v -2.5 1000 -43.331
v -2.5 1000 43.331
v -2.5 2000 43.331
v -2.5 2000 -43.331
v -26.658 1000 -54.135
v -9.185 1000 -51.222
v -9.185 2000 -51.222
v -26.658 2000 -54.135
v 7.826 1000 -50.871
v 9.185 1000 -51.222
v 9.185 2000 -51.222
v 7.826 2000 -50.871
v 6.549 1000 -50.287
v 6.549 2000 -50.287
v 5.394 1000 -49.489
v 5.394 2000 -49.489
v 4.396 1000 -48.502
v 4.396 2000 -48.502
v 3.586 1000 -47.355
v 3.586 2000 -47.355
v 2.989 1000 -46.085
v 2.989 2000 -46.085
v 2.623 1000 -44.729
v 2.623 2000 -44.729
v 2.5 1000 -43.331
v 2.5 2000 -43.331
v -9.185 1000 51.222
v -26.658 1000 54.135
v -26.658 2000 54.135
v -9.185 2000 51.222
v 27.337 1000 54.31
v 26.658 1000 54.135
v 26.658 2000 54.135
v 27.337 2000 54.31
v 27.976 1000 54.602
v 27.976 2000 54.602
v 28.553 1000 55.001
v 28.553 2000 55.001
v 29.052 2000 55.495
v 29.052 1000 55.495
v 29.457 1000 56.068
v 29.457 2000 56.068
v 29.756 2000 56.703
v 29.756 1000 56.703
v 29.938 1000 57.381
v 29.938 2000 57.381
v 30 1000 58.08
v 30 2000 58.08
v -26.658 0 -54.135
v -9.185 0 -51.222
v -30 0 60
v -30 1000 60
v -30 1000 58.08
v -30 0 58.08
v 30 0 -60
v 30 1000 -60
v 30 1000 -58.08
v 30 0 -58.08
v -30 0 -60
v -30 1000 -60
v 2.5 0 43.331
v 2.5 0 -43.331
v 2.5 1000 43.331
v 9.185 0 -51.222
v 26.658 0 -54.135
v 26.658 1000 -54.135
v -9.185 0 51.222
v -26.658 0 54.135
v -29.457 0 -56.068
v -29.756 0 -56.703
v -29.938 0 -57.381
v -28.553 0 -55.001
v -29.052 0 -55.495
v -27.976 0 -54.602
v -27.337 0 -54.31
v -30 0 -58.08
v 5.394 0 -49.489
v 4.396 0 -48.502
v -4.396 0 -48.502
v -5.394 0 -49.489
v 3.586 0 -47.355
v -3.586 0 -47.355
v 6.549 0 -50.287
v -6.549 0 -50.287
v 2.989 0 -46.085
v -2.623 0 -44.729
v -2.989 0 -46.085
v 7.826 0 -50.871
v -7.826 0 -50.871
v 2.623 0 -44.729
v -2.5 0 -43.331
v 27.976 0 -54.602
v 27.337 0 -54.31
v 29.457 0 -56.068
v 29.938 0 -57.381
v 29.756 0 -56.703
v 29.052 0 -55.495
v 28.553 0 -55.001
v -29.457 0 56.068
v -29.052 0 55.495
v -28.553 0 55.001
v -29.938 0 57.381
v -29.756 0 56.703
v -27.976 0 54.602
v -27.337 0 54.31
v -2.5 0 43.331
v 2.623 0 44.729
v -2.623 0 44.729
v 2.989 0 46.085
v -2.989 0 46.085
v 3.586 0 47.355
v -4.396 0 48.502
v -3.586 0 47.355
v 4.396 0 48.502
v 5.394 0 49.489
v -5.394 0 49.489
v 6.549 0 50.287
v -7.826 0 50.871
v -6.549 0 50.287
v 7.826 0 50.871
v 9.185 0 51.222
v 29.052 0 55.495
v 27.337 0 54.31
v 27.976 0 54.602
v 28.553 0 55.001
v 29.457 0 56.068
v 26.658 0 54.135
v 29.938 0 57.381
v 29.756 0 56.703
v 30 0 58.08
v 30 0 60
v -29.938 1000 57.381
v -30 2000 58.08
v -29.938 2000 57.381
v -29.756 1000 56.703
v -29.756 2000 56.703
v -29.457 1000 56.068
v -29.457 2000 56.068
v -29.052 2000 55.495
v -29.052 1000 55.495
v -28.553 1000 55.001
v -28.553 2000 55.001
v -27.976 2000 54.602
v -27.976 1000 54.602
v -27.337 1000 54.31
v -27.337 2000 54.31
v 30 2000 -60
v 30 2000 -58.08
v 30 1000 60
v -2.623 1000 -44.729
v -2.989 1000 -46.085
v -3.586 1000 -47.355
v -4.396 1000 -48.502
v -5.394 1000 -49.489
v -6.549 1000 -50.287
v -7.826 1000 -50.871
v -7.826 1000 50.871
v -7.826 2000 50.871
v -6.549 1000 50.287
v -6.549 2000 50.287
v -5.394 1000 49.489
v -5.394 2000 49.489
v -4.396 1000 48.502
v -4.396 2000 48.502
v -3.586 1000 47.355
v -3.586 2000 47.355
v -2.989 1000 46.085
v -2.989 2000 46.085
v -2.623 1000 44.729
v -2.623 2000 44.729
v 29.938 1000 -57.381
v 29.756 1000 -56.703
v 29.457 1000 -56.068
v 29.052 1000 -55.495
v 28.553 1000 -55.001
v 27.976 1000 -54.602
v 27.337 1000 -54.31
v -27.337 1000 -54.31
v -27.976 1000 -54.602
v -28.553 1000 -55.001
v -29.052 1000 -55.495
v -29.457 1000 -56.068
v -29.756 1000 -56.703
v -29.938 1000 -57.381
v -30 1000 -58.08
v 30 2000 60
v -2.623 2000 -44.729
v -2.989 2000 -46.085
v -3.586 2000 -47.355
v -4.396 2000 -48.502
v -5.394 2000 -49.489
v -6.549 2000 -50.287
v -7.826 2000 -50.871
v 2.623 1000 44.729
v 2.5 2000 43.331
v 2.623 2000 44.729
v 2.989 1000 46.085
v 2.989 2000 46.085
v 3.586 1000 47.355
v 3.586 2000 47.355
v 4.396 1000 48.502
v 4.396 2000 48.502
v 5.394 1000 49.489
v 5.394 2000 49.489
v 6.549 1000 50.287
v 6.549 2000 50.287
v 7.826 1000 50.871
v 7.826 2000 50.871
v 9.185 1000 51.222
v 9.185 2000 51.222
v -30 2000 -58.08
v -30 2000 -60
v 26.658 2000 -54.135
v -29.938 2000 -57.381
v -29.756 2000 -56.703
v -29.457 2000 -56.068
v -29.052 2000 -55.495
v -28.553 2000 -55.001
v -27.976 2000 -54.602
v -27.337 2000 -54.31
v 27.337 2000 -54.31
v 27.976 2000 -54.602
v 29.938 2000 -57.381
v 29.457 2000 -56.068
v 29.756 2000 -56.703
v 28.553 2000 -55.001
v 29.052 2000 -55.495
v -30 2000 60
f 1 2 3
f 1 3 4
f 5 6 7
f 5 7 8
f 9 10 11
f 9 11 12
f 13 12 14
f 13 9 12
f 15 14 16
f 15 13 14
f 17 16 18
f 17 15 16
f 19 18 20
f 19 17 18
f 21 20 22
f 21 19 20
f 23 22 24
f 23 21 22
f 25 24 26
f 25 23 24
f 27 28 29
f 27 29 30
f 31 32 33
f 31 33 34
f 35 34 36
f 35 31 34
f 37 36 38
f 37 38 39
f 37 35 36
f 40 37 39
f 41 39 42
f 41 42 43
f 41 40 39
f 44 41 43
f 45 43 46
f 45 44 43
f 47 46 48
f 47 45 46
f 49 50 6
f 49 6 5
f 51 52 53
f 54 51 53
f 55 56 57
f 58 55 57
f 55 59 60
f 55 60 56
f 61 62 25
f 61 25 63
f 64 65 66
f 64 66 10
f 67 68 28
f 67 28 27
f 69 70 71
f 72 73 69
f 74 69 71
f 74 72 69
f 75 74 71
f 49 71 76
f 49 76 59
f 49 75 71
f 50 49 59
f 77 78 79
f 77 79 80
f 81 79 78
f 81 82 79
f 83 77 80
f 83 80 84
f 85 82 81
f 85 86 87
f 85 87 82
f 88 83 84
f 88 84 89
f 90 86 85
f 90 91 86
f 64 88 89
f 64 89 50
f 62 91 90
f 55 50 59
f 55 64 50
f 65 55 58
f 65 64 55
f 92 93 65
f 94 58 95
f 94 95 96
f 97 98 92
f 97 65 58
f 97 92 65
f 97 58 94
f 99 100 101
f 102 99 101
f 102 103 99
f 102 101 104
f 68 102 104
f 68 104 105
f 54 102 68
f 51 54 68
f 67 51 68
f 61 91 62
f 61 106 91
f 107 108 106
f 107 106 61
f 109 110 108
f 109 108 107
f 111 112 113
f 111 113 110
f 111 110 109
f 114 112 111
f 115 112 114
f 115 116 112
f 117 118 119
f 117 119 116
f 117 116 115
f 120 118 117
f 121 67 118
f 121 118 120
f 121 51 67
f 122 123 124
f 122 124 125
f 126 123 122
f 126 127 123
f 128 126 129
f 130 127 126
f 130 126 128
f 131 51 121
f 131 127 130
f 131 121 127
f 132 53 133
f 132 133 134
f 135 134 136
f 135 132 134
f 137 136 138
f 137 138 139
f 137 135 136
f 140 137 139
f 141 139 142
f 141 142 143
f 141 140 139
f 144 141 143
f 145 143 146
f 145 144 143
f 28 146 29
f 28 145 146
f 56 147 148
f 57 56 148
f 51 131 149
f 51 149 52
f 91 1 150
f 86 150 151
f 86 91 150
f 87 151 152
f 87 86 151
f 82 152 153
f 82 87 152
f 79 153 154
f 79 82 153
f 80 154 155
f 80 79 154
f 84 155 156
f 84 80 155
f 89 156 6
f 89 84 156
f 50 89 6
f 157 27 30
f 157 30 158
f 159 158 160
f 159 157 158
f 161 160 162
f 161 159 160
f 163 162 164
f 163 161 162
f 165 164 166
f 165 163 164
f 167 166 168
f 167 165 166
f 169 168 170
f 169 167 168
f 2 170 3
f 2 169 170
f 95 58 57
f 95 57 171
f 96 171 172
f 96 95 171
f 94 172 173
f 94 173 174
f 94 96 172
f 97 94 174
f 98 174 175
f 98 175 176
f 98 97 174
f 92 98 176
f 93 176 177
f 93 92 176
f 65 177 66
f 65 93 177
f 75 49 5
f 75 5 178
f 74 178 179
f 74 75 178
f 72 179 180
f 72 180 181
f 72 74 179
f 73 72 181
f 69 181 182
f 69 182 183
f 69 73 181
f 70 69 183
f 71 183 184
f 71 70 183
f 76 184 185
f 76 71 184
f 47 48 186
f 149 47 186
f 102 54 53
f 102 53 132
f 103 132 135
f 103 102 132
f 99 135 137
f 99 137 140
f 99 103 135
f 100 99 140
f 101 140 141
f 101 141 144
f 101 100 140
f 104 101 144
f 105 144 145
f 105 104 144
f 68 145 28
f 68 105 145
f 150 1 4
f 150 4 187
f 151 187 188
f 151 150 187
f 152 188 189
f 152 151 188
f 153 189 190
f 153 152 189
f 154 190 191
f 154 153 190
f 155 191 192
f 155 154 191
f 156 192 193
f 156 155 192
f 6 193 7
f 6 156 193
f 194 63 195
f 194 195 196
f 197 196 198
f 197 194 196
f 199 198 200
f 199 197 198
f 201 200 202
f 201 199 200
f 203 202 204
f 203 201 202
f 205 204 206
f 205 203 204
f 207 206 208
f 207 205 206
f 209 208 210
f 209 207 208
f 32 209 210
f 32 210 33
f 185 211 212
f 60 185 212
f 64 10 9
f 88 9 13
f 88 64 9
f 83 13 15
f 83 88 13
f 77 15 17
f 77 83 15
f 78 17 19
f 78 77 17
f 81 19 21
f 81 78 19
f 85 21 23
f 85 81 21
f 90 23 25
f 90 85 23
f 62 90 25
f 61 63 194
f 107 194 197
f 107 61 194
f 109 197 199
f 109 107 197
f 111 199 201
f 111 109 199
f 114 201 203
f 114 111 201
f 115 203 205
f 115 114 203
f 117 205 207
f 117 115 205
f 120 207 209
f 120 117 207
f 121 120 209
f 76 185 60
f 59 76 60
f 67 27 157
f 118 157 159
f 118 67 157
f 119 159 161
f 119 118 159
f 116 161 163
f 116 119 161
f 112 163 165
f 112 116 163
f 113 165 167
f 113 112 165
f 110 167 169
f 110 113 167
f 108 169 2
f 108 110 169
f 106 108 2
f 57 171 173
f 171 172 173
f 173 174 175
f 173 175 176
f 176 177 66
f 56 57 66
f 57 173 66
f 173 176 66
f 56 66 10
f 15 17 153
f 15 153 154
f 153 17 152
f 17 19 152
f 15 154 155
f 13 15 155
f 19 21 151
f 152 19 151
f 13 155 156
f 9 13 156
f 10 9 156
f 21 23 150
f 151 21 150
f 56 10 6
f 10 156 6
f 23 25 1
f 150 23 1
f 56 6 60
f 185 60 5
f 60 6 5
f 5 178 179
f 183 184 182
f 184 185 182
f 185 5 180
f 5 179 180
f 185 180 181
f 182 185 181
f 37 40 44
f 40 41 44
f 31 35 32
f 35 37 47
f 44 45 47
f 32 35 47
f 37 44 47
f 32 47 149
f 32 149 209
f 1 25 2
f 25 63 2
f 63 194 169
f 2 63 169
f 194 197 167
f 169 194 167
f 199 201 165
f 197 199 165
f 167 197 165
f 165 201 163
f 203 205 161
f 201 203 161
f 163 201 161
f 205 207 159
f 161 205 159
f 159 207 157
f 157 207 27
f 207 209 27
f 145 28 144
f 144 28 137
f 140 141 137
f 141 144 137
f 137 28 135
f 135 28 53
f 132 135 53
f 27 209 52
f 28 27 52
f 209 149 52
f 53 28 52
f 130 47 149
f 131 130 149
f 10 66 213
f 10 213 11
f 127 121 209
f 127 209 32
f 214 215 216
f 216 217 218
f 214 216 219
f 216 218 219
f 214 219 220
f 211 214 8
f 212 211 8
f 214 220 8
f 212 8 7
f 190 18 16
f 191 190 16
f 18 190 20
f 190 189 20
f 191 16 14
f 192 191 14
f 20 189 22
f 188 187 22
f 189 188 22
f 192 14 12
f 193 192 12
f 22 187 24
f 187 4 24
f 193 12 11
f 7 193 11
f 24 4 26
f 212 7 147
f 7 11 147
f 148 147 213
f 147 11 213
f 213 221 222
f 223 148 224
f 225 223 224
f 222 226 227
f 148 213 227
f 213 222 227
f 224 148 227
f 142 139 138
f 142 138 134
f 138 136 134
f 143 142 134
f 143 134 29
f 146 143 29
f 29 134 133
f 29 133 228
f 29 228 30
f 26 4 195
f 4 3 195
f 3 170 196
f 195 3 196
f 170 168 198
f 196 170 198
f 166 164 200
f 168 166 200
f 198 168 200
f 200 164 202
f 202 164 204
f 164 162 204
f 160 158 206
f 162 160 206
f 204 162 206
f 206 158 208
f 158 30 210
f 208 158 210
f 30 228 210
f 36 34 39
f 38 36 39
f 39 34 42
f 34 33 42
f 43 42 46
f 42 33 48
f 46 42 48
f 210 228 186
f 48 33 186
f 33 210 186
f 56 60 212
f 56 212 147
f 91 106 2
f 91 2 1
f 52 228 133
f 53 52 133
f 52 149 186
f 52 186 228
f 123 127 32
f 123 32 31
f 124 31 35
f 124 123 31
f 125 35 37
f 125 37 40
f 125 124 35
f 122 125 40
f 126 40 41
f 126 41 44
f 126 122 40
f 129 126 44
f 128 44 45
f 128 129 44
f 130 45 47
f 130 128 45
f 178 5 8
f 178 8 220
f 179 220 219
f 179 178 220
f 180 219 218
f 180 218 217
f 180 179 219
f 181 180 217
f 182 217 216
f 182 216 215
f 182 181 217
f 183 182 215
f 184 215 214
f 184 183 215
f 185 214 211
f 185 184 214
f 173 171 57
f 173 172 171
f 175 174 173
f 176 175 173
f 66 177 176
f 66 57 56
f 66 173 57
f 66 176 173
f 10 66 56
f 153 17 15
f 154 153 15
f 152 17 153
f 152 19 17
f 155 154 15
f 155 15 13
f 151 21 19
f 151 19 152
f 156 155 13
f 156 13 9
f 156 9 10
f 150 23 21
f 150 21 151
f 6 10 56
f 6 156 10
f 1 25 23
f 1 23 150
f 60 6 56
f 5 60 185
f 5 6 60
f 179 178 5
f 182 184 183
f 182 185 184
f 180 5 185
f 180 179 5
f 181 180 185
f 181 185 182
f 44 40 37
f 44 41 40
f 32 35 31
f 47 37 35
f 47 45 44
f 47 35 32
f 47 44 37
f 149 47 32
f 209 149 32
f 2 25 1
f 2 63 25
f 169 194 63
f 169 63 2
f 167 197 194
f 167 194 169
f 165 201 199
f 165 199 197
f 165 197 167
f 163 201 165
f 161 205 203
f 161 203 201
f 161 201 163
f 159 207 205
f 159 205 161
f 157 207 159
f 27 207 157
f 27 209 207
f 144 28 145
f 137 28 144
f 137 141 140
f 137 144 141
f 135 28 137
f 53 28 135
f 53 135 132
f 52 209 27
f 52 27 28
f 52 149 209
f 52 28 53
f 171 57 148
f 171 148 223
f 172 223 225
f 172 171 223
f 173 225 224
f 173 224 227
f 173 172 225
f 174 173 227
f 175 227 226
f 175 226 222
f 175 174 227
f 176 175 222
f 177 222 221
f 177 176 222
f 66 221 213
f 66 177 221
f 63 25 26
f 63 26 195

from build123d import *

# Parameters (mm, degrees)
SB_BEAM_120_X_12_1_DEPTH = 2000
SPLIT1_SURFACE_1_BACK    = 2005.495
SPLIT1_SURFACE_1_DEPTH   = 4010.99
SPLIT1_SURFACE_2_BACK    = 2005.495
SPLIT1_SURFACE_2_DEPTH   = 4010.99


with BuildPart() as part:
    # Sketch15 → Sb beam 120 X 12(1) (new body)
    with BuildSketch(Plane(origin=(0, 0, 0), x_dir=(-1, 0, 0), z_dir=(0, 1, 0))):
        with BuildLine():
            Line((-30, -60), (-30, -58.080070835))
            ThreePointArc((-30, -58.080070835), (-29.052095223, -55.494589303), (-26.657642624, -54.134502919))
            Line((-26.657642624, -54.134502919), (-9.184714752, -51.222135832))
            ThreePointArc((-9.184714752, -51.222135832), (-4.395809555, -48.501963064), (-2.5, -43.331))
            Line((-2.5, -43.331), (-2.5, 43.331))
            ThreePointArc((-2.5, 43.331), (-4.395809555, 48.501963064), (-9.184714752, 51.222135832))
            Line((-9.184714752, 51.222135832), (-26.657642624, 54.134502919))
            ThreePointArc((-26.657642624, 54.134502919), (-29.052095223, 55.494589303), (-30, 58.080070835))
            Line((-30, 58.080070835), (-30, 60))
            Line((-30, 60), (30, 60))
            Line((30, 60), (30, 58.080070835))
            ThreePointArc((30, 58.080070835), (29.052095223, 55.494589303), (26.657642624, 54.134502919))
            Line((26.657642624, 54.134502919), (9.184714752, 51.222135832))
            ThreePointArc((9.184714752, 51.222135832), (4.395809555, 48.501963064), (2.5, 43.331))
            Line((2.5, 43.331), (2.5, -43.331))
            ThreePointArc((2.5, -43.331), (4.395809555, -48.501963064), (9.184714752, -51.222135832))
            Line((9.184714752, -51.222135832), (26.657642624, -54.134502919))
            ThreePointArc((26.657642624, -54.134502919), (29.052095223, -55.494589303), (30, -58.080070835))
            Line((30, -58.080070835), (30, -60))
            Line((30, -60), (-30, -60))
        make_face()
    extrude(amount=SB_BEAM_120_X_12_1_DEPTH)


with BuildPart() as body_2:
    # Split1: the piece behind the surface
    add(part.part)
    # Split1 surface: a surface, the sketch's curves swept straight by 4010.99 mm
    with BuildLine(Plane(origin=(0, 0, -60), x_dir=(-1, 0, 0), z_dir=(0, 0, -1)).offset(-SPLIT1_SURFACE_1_BACK), mode=Mode.PRIVATE) as split1_surface_1_path:
        Line((-30, 1000), (30, 1000))
    split1_surface_1 = Shell.extrude(split1_surface_1_path.wire(), (0 * SPLIT1_SURFACE_1_DEPTH, 0 * SPLIT1_SURFACE_1_DEPTH, -1 * SPLIT1_SURFACE_1_DEPTH))
    split(bisect_by=split1_surface_1, keep=Keep.BOTTOM)


with BuildPart() as part_1:
    add(part.part)

    # Split1: split by a surface, the side it looks to stays
    # Split1 surface: a surface, the sketch's curves swept straight by 4010.99 mm
    with BuildLine(Plane(origin=(0, 0, -60), x_dir=(-1, 0, 0), z_dir=(0, 0, -1)).offset(-SPLIT1_SURFACE_2_BACK), mode=Mode.PRIVATE) as split1_surface_2_path:
        Line((-30, 1000), (30, 1000))
    split1_surface_2 = Shell.extrude(split1_surface_2_path.wire(), (0 * SPLIT1_SURFACE_2_DEPTH, 0 * SPLIT1_SURFACE_2_DEPTH, -1 * SPLIT1_SURFACE_2_DEPTH))
    split(bisect_by=split1_surface_2, keep=Keep.TOP)


solid = Compound([body_2.part, part_1.part])
